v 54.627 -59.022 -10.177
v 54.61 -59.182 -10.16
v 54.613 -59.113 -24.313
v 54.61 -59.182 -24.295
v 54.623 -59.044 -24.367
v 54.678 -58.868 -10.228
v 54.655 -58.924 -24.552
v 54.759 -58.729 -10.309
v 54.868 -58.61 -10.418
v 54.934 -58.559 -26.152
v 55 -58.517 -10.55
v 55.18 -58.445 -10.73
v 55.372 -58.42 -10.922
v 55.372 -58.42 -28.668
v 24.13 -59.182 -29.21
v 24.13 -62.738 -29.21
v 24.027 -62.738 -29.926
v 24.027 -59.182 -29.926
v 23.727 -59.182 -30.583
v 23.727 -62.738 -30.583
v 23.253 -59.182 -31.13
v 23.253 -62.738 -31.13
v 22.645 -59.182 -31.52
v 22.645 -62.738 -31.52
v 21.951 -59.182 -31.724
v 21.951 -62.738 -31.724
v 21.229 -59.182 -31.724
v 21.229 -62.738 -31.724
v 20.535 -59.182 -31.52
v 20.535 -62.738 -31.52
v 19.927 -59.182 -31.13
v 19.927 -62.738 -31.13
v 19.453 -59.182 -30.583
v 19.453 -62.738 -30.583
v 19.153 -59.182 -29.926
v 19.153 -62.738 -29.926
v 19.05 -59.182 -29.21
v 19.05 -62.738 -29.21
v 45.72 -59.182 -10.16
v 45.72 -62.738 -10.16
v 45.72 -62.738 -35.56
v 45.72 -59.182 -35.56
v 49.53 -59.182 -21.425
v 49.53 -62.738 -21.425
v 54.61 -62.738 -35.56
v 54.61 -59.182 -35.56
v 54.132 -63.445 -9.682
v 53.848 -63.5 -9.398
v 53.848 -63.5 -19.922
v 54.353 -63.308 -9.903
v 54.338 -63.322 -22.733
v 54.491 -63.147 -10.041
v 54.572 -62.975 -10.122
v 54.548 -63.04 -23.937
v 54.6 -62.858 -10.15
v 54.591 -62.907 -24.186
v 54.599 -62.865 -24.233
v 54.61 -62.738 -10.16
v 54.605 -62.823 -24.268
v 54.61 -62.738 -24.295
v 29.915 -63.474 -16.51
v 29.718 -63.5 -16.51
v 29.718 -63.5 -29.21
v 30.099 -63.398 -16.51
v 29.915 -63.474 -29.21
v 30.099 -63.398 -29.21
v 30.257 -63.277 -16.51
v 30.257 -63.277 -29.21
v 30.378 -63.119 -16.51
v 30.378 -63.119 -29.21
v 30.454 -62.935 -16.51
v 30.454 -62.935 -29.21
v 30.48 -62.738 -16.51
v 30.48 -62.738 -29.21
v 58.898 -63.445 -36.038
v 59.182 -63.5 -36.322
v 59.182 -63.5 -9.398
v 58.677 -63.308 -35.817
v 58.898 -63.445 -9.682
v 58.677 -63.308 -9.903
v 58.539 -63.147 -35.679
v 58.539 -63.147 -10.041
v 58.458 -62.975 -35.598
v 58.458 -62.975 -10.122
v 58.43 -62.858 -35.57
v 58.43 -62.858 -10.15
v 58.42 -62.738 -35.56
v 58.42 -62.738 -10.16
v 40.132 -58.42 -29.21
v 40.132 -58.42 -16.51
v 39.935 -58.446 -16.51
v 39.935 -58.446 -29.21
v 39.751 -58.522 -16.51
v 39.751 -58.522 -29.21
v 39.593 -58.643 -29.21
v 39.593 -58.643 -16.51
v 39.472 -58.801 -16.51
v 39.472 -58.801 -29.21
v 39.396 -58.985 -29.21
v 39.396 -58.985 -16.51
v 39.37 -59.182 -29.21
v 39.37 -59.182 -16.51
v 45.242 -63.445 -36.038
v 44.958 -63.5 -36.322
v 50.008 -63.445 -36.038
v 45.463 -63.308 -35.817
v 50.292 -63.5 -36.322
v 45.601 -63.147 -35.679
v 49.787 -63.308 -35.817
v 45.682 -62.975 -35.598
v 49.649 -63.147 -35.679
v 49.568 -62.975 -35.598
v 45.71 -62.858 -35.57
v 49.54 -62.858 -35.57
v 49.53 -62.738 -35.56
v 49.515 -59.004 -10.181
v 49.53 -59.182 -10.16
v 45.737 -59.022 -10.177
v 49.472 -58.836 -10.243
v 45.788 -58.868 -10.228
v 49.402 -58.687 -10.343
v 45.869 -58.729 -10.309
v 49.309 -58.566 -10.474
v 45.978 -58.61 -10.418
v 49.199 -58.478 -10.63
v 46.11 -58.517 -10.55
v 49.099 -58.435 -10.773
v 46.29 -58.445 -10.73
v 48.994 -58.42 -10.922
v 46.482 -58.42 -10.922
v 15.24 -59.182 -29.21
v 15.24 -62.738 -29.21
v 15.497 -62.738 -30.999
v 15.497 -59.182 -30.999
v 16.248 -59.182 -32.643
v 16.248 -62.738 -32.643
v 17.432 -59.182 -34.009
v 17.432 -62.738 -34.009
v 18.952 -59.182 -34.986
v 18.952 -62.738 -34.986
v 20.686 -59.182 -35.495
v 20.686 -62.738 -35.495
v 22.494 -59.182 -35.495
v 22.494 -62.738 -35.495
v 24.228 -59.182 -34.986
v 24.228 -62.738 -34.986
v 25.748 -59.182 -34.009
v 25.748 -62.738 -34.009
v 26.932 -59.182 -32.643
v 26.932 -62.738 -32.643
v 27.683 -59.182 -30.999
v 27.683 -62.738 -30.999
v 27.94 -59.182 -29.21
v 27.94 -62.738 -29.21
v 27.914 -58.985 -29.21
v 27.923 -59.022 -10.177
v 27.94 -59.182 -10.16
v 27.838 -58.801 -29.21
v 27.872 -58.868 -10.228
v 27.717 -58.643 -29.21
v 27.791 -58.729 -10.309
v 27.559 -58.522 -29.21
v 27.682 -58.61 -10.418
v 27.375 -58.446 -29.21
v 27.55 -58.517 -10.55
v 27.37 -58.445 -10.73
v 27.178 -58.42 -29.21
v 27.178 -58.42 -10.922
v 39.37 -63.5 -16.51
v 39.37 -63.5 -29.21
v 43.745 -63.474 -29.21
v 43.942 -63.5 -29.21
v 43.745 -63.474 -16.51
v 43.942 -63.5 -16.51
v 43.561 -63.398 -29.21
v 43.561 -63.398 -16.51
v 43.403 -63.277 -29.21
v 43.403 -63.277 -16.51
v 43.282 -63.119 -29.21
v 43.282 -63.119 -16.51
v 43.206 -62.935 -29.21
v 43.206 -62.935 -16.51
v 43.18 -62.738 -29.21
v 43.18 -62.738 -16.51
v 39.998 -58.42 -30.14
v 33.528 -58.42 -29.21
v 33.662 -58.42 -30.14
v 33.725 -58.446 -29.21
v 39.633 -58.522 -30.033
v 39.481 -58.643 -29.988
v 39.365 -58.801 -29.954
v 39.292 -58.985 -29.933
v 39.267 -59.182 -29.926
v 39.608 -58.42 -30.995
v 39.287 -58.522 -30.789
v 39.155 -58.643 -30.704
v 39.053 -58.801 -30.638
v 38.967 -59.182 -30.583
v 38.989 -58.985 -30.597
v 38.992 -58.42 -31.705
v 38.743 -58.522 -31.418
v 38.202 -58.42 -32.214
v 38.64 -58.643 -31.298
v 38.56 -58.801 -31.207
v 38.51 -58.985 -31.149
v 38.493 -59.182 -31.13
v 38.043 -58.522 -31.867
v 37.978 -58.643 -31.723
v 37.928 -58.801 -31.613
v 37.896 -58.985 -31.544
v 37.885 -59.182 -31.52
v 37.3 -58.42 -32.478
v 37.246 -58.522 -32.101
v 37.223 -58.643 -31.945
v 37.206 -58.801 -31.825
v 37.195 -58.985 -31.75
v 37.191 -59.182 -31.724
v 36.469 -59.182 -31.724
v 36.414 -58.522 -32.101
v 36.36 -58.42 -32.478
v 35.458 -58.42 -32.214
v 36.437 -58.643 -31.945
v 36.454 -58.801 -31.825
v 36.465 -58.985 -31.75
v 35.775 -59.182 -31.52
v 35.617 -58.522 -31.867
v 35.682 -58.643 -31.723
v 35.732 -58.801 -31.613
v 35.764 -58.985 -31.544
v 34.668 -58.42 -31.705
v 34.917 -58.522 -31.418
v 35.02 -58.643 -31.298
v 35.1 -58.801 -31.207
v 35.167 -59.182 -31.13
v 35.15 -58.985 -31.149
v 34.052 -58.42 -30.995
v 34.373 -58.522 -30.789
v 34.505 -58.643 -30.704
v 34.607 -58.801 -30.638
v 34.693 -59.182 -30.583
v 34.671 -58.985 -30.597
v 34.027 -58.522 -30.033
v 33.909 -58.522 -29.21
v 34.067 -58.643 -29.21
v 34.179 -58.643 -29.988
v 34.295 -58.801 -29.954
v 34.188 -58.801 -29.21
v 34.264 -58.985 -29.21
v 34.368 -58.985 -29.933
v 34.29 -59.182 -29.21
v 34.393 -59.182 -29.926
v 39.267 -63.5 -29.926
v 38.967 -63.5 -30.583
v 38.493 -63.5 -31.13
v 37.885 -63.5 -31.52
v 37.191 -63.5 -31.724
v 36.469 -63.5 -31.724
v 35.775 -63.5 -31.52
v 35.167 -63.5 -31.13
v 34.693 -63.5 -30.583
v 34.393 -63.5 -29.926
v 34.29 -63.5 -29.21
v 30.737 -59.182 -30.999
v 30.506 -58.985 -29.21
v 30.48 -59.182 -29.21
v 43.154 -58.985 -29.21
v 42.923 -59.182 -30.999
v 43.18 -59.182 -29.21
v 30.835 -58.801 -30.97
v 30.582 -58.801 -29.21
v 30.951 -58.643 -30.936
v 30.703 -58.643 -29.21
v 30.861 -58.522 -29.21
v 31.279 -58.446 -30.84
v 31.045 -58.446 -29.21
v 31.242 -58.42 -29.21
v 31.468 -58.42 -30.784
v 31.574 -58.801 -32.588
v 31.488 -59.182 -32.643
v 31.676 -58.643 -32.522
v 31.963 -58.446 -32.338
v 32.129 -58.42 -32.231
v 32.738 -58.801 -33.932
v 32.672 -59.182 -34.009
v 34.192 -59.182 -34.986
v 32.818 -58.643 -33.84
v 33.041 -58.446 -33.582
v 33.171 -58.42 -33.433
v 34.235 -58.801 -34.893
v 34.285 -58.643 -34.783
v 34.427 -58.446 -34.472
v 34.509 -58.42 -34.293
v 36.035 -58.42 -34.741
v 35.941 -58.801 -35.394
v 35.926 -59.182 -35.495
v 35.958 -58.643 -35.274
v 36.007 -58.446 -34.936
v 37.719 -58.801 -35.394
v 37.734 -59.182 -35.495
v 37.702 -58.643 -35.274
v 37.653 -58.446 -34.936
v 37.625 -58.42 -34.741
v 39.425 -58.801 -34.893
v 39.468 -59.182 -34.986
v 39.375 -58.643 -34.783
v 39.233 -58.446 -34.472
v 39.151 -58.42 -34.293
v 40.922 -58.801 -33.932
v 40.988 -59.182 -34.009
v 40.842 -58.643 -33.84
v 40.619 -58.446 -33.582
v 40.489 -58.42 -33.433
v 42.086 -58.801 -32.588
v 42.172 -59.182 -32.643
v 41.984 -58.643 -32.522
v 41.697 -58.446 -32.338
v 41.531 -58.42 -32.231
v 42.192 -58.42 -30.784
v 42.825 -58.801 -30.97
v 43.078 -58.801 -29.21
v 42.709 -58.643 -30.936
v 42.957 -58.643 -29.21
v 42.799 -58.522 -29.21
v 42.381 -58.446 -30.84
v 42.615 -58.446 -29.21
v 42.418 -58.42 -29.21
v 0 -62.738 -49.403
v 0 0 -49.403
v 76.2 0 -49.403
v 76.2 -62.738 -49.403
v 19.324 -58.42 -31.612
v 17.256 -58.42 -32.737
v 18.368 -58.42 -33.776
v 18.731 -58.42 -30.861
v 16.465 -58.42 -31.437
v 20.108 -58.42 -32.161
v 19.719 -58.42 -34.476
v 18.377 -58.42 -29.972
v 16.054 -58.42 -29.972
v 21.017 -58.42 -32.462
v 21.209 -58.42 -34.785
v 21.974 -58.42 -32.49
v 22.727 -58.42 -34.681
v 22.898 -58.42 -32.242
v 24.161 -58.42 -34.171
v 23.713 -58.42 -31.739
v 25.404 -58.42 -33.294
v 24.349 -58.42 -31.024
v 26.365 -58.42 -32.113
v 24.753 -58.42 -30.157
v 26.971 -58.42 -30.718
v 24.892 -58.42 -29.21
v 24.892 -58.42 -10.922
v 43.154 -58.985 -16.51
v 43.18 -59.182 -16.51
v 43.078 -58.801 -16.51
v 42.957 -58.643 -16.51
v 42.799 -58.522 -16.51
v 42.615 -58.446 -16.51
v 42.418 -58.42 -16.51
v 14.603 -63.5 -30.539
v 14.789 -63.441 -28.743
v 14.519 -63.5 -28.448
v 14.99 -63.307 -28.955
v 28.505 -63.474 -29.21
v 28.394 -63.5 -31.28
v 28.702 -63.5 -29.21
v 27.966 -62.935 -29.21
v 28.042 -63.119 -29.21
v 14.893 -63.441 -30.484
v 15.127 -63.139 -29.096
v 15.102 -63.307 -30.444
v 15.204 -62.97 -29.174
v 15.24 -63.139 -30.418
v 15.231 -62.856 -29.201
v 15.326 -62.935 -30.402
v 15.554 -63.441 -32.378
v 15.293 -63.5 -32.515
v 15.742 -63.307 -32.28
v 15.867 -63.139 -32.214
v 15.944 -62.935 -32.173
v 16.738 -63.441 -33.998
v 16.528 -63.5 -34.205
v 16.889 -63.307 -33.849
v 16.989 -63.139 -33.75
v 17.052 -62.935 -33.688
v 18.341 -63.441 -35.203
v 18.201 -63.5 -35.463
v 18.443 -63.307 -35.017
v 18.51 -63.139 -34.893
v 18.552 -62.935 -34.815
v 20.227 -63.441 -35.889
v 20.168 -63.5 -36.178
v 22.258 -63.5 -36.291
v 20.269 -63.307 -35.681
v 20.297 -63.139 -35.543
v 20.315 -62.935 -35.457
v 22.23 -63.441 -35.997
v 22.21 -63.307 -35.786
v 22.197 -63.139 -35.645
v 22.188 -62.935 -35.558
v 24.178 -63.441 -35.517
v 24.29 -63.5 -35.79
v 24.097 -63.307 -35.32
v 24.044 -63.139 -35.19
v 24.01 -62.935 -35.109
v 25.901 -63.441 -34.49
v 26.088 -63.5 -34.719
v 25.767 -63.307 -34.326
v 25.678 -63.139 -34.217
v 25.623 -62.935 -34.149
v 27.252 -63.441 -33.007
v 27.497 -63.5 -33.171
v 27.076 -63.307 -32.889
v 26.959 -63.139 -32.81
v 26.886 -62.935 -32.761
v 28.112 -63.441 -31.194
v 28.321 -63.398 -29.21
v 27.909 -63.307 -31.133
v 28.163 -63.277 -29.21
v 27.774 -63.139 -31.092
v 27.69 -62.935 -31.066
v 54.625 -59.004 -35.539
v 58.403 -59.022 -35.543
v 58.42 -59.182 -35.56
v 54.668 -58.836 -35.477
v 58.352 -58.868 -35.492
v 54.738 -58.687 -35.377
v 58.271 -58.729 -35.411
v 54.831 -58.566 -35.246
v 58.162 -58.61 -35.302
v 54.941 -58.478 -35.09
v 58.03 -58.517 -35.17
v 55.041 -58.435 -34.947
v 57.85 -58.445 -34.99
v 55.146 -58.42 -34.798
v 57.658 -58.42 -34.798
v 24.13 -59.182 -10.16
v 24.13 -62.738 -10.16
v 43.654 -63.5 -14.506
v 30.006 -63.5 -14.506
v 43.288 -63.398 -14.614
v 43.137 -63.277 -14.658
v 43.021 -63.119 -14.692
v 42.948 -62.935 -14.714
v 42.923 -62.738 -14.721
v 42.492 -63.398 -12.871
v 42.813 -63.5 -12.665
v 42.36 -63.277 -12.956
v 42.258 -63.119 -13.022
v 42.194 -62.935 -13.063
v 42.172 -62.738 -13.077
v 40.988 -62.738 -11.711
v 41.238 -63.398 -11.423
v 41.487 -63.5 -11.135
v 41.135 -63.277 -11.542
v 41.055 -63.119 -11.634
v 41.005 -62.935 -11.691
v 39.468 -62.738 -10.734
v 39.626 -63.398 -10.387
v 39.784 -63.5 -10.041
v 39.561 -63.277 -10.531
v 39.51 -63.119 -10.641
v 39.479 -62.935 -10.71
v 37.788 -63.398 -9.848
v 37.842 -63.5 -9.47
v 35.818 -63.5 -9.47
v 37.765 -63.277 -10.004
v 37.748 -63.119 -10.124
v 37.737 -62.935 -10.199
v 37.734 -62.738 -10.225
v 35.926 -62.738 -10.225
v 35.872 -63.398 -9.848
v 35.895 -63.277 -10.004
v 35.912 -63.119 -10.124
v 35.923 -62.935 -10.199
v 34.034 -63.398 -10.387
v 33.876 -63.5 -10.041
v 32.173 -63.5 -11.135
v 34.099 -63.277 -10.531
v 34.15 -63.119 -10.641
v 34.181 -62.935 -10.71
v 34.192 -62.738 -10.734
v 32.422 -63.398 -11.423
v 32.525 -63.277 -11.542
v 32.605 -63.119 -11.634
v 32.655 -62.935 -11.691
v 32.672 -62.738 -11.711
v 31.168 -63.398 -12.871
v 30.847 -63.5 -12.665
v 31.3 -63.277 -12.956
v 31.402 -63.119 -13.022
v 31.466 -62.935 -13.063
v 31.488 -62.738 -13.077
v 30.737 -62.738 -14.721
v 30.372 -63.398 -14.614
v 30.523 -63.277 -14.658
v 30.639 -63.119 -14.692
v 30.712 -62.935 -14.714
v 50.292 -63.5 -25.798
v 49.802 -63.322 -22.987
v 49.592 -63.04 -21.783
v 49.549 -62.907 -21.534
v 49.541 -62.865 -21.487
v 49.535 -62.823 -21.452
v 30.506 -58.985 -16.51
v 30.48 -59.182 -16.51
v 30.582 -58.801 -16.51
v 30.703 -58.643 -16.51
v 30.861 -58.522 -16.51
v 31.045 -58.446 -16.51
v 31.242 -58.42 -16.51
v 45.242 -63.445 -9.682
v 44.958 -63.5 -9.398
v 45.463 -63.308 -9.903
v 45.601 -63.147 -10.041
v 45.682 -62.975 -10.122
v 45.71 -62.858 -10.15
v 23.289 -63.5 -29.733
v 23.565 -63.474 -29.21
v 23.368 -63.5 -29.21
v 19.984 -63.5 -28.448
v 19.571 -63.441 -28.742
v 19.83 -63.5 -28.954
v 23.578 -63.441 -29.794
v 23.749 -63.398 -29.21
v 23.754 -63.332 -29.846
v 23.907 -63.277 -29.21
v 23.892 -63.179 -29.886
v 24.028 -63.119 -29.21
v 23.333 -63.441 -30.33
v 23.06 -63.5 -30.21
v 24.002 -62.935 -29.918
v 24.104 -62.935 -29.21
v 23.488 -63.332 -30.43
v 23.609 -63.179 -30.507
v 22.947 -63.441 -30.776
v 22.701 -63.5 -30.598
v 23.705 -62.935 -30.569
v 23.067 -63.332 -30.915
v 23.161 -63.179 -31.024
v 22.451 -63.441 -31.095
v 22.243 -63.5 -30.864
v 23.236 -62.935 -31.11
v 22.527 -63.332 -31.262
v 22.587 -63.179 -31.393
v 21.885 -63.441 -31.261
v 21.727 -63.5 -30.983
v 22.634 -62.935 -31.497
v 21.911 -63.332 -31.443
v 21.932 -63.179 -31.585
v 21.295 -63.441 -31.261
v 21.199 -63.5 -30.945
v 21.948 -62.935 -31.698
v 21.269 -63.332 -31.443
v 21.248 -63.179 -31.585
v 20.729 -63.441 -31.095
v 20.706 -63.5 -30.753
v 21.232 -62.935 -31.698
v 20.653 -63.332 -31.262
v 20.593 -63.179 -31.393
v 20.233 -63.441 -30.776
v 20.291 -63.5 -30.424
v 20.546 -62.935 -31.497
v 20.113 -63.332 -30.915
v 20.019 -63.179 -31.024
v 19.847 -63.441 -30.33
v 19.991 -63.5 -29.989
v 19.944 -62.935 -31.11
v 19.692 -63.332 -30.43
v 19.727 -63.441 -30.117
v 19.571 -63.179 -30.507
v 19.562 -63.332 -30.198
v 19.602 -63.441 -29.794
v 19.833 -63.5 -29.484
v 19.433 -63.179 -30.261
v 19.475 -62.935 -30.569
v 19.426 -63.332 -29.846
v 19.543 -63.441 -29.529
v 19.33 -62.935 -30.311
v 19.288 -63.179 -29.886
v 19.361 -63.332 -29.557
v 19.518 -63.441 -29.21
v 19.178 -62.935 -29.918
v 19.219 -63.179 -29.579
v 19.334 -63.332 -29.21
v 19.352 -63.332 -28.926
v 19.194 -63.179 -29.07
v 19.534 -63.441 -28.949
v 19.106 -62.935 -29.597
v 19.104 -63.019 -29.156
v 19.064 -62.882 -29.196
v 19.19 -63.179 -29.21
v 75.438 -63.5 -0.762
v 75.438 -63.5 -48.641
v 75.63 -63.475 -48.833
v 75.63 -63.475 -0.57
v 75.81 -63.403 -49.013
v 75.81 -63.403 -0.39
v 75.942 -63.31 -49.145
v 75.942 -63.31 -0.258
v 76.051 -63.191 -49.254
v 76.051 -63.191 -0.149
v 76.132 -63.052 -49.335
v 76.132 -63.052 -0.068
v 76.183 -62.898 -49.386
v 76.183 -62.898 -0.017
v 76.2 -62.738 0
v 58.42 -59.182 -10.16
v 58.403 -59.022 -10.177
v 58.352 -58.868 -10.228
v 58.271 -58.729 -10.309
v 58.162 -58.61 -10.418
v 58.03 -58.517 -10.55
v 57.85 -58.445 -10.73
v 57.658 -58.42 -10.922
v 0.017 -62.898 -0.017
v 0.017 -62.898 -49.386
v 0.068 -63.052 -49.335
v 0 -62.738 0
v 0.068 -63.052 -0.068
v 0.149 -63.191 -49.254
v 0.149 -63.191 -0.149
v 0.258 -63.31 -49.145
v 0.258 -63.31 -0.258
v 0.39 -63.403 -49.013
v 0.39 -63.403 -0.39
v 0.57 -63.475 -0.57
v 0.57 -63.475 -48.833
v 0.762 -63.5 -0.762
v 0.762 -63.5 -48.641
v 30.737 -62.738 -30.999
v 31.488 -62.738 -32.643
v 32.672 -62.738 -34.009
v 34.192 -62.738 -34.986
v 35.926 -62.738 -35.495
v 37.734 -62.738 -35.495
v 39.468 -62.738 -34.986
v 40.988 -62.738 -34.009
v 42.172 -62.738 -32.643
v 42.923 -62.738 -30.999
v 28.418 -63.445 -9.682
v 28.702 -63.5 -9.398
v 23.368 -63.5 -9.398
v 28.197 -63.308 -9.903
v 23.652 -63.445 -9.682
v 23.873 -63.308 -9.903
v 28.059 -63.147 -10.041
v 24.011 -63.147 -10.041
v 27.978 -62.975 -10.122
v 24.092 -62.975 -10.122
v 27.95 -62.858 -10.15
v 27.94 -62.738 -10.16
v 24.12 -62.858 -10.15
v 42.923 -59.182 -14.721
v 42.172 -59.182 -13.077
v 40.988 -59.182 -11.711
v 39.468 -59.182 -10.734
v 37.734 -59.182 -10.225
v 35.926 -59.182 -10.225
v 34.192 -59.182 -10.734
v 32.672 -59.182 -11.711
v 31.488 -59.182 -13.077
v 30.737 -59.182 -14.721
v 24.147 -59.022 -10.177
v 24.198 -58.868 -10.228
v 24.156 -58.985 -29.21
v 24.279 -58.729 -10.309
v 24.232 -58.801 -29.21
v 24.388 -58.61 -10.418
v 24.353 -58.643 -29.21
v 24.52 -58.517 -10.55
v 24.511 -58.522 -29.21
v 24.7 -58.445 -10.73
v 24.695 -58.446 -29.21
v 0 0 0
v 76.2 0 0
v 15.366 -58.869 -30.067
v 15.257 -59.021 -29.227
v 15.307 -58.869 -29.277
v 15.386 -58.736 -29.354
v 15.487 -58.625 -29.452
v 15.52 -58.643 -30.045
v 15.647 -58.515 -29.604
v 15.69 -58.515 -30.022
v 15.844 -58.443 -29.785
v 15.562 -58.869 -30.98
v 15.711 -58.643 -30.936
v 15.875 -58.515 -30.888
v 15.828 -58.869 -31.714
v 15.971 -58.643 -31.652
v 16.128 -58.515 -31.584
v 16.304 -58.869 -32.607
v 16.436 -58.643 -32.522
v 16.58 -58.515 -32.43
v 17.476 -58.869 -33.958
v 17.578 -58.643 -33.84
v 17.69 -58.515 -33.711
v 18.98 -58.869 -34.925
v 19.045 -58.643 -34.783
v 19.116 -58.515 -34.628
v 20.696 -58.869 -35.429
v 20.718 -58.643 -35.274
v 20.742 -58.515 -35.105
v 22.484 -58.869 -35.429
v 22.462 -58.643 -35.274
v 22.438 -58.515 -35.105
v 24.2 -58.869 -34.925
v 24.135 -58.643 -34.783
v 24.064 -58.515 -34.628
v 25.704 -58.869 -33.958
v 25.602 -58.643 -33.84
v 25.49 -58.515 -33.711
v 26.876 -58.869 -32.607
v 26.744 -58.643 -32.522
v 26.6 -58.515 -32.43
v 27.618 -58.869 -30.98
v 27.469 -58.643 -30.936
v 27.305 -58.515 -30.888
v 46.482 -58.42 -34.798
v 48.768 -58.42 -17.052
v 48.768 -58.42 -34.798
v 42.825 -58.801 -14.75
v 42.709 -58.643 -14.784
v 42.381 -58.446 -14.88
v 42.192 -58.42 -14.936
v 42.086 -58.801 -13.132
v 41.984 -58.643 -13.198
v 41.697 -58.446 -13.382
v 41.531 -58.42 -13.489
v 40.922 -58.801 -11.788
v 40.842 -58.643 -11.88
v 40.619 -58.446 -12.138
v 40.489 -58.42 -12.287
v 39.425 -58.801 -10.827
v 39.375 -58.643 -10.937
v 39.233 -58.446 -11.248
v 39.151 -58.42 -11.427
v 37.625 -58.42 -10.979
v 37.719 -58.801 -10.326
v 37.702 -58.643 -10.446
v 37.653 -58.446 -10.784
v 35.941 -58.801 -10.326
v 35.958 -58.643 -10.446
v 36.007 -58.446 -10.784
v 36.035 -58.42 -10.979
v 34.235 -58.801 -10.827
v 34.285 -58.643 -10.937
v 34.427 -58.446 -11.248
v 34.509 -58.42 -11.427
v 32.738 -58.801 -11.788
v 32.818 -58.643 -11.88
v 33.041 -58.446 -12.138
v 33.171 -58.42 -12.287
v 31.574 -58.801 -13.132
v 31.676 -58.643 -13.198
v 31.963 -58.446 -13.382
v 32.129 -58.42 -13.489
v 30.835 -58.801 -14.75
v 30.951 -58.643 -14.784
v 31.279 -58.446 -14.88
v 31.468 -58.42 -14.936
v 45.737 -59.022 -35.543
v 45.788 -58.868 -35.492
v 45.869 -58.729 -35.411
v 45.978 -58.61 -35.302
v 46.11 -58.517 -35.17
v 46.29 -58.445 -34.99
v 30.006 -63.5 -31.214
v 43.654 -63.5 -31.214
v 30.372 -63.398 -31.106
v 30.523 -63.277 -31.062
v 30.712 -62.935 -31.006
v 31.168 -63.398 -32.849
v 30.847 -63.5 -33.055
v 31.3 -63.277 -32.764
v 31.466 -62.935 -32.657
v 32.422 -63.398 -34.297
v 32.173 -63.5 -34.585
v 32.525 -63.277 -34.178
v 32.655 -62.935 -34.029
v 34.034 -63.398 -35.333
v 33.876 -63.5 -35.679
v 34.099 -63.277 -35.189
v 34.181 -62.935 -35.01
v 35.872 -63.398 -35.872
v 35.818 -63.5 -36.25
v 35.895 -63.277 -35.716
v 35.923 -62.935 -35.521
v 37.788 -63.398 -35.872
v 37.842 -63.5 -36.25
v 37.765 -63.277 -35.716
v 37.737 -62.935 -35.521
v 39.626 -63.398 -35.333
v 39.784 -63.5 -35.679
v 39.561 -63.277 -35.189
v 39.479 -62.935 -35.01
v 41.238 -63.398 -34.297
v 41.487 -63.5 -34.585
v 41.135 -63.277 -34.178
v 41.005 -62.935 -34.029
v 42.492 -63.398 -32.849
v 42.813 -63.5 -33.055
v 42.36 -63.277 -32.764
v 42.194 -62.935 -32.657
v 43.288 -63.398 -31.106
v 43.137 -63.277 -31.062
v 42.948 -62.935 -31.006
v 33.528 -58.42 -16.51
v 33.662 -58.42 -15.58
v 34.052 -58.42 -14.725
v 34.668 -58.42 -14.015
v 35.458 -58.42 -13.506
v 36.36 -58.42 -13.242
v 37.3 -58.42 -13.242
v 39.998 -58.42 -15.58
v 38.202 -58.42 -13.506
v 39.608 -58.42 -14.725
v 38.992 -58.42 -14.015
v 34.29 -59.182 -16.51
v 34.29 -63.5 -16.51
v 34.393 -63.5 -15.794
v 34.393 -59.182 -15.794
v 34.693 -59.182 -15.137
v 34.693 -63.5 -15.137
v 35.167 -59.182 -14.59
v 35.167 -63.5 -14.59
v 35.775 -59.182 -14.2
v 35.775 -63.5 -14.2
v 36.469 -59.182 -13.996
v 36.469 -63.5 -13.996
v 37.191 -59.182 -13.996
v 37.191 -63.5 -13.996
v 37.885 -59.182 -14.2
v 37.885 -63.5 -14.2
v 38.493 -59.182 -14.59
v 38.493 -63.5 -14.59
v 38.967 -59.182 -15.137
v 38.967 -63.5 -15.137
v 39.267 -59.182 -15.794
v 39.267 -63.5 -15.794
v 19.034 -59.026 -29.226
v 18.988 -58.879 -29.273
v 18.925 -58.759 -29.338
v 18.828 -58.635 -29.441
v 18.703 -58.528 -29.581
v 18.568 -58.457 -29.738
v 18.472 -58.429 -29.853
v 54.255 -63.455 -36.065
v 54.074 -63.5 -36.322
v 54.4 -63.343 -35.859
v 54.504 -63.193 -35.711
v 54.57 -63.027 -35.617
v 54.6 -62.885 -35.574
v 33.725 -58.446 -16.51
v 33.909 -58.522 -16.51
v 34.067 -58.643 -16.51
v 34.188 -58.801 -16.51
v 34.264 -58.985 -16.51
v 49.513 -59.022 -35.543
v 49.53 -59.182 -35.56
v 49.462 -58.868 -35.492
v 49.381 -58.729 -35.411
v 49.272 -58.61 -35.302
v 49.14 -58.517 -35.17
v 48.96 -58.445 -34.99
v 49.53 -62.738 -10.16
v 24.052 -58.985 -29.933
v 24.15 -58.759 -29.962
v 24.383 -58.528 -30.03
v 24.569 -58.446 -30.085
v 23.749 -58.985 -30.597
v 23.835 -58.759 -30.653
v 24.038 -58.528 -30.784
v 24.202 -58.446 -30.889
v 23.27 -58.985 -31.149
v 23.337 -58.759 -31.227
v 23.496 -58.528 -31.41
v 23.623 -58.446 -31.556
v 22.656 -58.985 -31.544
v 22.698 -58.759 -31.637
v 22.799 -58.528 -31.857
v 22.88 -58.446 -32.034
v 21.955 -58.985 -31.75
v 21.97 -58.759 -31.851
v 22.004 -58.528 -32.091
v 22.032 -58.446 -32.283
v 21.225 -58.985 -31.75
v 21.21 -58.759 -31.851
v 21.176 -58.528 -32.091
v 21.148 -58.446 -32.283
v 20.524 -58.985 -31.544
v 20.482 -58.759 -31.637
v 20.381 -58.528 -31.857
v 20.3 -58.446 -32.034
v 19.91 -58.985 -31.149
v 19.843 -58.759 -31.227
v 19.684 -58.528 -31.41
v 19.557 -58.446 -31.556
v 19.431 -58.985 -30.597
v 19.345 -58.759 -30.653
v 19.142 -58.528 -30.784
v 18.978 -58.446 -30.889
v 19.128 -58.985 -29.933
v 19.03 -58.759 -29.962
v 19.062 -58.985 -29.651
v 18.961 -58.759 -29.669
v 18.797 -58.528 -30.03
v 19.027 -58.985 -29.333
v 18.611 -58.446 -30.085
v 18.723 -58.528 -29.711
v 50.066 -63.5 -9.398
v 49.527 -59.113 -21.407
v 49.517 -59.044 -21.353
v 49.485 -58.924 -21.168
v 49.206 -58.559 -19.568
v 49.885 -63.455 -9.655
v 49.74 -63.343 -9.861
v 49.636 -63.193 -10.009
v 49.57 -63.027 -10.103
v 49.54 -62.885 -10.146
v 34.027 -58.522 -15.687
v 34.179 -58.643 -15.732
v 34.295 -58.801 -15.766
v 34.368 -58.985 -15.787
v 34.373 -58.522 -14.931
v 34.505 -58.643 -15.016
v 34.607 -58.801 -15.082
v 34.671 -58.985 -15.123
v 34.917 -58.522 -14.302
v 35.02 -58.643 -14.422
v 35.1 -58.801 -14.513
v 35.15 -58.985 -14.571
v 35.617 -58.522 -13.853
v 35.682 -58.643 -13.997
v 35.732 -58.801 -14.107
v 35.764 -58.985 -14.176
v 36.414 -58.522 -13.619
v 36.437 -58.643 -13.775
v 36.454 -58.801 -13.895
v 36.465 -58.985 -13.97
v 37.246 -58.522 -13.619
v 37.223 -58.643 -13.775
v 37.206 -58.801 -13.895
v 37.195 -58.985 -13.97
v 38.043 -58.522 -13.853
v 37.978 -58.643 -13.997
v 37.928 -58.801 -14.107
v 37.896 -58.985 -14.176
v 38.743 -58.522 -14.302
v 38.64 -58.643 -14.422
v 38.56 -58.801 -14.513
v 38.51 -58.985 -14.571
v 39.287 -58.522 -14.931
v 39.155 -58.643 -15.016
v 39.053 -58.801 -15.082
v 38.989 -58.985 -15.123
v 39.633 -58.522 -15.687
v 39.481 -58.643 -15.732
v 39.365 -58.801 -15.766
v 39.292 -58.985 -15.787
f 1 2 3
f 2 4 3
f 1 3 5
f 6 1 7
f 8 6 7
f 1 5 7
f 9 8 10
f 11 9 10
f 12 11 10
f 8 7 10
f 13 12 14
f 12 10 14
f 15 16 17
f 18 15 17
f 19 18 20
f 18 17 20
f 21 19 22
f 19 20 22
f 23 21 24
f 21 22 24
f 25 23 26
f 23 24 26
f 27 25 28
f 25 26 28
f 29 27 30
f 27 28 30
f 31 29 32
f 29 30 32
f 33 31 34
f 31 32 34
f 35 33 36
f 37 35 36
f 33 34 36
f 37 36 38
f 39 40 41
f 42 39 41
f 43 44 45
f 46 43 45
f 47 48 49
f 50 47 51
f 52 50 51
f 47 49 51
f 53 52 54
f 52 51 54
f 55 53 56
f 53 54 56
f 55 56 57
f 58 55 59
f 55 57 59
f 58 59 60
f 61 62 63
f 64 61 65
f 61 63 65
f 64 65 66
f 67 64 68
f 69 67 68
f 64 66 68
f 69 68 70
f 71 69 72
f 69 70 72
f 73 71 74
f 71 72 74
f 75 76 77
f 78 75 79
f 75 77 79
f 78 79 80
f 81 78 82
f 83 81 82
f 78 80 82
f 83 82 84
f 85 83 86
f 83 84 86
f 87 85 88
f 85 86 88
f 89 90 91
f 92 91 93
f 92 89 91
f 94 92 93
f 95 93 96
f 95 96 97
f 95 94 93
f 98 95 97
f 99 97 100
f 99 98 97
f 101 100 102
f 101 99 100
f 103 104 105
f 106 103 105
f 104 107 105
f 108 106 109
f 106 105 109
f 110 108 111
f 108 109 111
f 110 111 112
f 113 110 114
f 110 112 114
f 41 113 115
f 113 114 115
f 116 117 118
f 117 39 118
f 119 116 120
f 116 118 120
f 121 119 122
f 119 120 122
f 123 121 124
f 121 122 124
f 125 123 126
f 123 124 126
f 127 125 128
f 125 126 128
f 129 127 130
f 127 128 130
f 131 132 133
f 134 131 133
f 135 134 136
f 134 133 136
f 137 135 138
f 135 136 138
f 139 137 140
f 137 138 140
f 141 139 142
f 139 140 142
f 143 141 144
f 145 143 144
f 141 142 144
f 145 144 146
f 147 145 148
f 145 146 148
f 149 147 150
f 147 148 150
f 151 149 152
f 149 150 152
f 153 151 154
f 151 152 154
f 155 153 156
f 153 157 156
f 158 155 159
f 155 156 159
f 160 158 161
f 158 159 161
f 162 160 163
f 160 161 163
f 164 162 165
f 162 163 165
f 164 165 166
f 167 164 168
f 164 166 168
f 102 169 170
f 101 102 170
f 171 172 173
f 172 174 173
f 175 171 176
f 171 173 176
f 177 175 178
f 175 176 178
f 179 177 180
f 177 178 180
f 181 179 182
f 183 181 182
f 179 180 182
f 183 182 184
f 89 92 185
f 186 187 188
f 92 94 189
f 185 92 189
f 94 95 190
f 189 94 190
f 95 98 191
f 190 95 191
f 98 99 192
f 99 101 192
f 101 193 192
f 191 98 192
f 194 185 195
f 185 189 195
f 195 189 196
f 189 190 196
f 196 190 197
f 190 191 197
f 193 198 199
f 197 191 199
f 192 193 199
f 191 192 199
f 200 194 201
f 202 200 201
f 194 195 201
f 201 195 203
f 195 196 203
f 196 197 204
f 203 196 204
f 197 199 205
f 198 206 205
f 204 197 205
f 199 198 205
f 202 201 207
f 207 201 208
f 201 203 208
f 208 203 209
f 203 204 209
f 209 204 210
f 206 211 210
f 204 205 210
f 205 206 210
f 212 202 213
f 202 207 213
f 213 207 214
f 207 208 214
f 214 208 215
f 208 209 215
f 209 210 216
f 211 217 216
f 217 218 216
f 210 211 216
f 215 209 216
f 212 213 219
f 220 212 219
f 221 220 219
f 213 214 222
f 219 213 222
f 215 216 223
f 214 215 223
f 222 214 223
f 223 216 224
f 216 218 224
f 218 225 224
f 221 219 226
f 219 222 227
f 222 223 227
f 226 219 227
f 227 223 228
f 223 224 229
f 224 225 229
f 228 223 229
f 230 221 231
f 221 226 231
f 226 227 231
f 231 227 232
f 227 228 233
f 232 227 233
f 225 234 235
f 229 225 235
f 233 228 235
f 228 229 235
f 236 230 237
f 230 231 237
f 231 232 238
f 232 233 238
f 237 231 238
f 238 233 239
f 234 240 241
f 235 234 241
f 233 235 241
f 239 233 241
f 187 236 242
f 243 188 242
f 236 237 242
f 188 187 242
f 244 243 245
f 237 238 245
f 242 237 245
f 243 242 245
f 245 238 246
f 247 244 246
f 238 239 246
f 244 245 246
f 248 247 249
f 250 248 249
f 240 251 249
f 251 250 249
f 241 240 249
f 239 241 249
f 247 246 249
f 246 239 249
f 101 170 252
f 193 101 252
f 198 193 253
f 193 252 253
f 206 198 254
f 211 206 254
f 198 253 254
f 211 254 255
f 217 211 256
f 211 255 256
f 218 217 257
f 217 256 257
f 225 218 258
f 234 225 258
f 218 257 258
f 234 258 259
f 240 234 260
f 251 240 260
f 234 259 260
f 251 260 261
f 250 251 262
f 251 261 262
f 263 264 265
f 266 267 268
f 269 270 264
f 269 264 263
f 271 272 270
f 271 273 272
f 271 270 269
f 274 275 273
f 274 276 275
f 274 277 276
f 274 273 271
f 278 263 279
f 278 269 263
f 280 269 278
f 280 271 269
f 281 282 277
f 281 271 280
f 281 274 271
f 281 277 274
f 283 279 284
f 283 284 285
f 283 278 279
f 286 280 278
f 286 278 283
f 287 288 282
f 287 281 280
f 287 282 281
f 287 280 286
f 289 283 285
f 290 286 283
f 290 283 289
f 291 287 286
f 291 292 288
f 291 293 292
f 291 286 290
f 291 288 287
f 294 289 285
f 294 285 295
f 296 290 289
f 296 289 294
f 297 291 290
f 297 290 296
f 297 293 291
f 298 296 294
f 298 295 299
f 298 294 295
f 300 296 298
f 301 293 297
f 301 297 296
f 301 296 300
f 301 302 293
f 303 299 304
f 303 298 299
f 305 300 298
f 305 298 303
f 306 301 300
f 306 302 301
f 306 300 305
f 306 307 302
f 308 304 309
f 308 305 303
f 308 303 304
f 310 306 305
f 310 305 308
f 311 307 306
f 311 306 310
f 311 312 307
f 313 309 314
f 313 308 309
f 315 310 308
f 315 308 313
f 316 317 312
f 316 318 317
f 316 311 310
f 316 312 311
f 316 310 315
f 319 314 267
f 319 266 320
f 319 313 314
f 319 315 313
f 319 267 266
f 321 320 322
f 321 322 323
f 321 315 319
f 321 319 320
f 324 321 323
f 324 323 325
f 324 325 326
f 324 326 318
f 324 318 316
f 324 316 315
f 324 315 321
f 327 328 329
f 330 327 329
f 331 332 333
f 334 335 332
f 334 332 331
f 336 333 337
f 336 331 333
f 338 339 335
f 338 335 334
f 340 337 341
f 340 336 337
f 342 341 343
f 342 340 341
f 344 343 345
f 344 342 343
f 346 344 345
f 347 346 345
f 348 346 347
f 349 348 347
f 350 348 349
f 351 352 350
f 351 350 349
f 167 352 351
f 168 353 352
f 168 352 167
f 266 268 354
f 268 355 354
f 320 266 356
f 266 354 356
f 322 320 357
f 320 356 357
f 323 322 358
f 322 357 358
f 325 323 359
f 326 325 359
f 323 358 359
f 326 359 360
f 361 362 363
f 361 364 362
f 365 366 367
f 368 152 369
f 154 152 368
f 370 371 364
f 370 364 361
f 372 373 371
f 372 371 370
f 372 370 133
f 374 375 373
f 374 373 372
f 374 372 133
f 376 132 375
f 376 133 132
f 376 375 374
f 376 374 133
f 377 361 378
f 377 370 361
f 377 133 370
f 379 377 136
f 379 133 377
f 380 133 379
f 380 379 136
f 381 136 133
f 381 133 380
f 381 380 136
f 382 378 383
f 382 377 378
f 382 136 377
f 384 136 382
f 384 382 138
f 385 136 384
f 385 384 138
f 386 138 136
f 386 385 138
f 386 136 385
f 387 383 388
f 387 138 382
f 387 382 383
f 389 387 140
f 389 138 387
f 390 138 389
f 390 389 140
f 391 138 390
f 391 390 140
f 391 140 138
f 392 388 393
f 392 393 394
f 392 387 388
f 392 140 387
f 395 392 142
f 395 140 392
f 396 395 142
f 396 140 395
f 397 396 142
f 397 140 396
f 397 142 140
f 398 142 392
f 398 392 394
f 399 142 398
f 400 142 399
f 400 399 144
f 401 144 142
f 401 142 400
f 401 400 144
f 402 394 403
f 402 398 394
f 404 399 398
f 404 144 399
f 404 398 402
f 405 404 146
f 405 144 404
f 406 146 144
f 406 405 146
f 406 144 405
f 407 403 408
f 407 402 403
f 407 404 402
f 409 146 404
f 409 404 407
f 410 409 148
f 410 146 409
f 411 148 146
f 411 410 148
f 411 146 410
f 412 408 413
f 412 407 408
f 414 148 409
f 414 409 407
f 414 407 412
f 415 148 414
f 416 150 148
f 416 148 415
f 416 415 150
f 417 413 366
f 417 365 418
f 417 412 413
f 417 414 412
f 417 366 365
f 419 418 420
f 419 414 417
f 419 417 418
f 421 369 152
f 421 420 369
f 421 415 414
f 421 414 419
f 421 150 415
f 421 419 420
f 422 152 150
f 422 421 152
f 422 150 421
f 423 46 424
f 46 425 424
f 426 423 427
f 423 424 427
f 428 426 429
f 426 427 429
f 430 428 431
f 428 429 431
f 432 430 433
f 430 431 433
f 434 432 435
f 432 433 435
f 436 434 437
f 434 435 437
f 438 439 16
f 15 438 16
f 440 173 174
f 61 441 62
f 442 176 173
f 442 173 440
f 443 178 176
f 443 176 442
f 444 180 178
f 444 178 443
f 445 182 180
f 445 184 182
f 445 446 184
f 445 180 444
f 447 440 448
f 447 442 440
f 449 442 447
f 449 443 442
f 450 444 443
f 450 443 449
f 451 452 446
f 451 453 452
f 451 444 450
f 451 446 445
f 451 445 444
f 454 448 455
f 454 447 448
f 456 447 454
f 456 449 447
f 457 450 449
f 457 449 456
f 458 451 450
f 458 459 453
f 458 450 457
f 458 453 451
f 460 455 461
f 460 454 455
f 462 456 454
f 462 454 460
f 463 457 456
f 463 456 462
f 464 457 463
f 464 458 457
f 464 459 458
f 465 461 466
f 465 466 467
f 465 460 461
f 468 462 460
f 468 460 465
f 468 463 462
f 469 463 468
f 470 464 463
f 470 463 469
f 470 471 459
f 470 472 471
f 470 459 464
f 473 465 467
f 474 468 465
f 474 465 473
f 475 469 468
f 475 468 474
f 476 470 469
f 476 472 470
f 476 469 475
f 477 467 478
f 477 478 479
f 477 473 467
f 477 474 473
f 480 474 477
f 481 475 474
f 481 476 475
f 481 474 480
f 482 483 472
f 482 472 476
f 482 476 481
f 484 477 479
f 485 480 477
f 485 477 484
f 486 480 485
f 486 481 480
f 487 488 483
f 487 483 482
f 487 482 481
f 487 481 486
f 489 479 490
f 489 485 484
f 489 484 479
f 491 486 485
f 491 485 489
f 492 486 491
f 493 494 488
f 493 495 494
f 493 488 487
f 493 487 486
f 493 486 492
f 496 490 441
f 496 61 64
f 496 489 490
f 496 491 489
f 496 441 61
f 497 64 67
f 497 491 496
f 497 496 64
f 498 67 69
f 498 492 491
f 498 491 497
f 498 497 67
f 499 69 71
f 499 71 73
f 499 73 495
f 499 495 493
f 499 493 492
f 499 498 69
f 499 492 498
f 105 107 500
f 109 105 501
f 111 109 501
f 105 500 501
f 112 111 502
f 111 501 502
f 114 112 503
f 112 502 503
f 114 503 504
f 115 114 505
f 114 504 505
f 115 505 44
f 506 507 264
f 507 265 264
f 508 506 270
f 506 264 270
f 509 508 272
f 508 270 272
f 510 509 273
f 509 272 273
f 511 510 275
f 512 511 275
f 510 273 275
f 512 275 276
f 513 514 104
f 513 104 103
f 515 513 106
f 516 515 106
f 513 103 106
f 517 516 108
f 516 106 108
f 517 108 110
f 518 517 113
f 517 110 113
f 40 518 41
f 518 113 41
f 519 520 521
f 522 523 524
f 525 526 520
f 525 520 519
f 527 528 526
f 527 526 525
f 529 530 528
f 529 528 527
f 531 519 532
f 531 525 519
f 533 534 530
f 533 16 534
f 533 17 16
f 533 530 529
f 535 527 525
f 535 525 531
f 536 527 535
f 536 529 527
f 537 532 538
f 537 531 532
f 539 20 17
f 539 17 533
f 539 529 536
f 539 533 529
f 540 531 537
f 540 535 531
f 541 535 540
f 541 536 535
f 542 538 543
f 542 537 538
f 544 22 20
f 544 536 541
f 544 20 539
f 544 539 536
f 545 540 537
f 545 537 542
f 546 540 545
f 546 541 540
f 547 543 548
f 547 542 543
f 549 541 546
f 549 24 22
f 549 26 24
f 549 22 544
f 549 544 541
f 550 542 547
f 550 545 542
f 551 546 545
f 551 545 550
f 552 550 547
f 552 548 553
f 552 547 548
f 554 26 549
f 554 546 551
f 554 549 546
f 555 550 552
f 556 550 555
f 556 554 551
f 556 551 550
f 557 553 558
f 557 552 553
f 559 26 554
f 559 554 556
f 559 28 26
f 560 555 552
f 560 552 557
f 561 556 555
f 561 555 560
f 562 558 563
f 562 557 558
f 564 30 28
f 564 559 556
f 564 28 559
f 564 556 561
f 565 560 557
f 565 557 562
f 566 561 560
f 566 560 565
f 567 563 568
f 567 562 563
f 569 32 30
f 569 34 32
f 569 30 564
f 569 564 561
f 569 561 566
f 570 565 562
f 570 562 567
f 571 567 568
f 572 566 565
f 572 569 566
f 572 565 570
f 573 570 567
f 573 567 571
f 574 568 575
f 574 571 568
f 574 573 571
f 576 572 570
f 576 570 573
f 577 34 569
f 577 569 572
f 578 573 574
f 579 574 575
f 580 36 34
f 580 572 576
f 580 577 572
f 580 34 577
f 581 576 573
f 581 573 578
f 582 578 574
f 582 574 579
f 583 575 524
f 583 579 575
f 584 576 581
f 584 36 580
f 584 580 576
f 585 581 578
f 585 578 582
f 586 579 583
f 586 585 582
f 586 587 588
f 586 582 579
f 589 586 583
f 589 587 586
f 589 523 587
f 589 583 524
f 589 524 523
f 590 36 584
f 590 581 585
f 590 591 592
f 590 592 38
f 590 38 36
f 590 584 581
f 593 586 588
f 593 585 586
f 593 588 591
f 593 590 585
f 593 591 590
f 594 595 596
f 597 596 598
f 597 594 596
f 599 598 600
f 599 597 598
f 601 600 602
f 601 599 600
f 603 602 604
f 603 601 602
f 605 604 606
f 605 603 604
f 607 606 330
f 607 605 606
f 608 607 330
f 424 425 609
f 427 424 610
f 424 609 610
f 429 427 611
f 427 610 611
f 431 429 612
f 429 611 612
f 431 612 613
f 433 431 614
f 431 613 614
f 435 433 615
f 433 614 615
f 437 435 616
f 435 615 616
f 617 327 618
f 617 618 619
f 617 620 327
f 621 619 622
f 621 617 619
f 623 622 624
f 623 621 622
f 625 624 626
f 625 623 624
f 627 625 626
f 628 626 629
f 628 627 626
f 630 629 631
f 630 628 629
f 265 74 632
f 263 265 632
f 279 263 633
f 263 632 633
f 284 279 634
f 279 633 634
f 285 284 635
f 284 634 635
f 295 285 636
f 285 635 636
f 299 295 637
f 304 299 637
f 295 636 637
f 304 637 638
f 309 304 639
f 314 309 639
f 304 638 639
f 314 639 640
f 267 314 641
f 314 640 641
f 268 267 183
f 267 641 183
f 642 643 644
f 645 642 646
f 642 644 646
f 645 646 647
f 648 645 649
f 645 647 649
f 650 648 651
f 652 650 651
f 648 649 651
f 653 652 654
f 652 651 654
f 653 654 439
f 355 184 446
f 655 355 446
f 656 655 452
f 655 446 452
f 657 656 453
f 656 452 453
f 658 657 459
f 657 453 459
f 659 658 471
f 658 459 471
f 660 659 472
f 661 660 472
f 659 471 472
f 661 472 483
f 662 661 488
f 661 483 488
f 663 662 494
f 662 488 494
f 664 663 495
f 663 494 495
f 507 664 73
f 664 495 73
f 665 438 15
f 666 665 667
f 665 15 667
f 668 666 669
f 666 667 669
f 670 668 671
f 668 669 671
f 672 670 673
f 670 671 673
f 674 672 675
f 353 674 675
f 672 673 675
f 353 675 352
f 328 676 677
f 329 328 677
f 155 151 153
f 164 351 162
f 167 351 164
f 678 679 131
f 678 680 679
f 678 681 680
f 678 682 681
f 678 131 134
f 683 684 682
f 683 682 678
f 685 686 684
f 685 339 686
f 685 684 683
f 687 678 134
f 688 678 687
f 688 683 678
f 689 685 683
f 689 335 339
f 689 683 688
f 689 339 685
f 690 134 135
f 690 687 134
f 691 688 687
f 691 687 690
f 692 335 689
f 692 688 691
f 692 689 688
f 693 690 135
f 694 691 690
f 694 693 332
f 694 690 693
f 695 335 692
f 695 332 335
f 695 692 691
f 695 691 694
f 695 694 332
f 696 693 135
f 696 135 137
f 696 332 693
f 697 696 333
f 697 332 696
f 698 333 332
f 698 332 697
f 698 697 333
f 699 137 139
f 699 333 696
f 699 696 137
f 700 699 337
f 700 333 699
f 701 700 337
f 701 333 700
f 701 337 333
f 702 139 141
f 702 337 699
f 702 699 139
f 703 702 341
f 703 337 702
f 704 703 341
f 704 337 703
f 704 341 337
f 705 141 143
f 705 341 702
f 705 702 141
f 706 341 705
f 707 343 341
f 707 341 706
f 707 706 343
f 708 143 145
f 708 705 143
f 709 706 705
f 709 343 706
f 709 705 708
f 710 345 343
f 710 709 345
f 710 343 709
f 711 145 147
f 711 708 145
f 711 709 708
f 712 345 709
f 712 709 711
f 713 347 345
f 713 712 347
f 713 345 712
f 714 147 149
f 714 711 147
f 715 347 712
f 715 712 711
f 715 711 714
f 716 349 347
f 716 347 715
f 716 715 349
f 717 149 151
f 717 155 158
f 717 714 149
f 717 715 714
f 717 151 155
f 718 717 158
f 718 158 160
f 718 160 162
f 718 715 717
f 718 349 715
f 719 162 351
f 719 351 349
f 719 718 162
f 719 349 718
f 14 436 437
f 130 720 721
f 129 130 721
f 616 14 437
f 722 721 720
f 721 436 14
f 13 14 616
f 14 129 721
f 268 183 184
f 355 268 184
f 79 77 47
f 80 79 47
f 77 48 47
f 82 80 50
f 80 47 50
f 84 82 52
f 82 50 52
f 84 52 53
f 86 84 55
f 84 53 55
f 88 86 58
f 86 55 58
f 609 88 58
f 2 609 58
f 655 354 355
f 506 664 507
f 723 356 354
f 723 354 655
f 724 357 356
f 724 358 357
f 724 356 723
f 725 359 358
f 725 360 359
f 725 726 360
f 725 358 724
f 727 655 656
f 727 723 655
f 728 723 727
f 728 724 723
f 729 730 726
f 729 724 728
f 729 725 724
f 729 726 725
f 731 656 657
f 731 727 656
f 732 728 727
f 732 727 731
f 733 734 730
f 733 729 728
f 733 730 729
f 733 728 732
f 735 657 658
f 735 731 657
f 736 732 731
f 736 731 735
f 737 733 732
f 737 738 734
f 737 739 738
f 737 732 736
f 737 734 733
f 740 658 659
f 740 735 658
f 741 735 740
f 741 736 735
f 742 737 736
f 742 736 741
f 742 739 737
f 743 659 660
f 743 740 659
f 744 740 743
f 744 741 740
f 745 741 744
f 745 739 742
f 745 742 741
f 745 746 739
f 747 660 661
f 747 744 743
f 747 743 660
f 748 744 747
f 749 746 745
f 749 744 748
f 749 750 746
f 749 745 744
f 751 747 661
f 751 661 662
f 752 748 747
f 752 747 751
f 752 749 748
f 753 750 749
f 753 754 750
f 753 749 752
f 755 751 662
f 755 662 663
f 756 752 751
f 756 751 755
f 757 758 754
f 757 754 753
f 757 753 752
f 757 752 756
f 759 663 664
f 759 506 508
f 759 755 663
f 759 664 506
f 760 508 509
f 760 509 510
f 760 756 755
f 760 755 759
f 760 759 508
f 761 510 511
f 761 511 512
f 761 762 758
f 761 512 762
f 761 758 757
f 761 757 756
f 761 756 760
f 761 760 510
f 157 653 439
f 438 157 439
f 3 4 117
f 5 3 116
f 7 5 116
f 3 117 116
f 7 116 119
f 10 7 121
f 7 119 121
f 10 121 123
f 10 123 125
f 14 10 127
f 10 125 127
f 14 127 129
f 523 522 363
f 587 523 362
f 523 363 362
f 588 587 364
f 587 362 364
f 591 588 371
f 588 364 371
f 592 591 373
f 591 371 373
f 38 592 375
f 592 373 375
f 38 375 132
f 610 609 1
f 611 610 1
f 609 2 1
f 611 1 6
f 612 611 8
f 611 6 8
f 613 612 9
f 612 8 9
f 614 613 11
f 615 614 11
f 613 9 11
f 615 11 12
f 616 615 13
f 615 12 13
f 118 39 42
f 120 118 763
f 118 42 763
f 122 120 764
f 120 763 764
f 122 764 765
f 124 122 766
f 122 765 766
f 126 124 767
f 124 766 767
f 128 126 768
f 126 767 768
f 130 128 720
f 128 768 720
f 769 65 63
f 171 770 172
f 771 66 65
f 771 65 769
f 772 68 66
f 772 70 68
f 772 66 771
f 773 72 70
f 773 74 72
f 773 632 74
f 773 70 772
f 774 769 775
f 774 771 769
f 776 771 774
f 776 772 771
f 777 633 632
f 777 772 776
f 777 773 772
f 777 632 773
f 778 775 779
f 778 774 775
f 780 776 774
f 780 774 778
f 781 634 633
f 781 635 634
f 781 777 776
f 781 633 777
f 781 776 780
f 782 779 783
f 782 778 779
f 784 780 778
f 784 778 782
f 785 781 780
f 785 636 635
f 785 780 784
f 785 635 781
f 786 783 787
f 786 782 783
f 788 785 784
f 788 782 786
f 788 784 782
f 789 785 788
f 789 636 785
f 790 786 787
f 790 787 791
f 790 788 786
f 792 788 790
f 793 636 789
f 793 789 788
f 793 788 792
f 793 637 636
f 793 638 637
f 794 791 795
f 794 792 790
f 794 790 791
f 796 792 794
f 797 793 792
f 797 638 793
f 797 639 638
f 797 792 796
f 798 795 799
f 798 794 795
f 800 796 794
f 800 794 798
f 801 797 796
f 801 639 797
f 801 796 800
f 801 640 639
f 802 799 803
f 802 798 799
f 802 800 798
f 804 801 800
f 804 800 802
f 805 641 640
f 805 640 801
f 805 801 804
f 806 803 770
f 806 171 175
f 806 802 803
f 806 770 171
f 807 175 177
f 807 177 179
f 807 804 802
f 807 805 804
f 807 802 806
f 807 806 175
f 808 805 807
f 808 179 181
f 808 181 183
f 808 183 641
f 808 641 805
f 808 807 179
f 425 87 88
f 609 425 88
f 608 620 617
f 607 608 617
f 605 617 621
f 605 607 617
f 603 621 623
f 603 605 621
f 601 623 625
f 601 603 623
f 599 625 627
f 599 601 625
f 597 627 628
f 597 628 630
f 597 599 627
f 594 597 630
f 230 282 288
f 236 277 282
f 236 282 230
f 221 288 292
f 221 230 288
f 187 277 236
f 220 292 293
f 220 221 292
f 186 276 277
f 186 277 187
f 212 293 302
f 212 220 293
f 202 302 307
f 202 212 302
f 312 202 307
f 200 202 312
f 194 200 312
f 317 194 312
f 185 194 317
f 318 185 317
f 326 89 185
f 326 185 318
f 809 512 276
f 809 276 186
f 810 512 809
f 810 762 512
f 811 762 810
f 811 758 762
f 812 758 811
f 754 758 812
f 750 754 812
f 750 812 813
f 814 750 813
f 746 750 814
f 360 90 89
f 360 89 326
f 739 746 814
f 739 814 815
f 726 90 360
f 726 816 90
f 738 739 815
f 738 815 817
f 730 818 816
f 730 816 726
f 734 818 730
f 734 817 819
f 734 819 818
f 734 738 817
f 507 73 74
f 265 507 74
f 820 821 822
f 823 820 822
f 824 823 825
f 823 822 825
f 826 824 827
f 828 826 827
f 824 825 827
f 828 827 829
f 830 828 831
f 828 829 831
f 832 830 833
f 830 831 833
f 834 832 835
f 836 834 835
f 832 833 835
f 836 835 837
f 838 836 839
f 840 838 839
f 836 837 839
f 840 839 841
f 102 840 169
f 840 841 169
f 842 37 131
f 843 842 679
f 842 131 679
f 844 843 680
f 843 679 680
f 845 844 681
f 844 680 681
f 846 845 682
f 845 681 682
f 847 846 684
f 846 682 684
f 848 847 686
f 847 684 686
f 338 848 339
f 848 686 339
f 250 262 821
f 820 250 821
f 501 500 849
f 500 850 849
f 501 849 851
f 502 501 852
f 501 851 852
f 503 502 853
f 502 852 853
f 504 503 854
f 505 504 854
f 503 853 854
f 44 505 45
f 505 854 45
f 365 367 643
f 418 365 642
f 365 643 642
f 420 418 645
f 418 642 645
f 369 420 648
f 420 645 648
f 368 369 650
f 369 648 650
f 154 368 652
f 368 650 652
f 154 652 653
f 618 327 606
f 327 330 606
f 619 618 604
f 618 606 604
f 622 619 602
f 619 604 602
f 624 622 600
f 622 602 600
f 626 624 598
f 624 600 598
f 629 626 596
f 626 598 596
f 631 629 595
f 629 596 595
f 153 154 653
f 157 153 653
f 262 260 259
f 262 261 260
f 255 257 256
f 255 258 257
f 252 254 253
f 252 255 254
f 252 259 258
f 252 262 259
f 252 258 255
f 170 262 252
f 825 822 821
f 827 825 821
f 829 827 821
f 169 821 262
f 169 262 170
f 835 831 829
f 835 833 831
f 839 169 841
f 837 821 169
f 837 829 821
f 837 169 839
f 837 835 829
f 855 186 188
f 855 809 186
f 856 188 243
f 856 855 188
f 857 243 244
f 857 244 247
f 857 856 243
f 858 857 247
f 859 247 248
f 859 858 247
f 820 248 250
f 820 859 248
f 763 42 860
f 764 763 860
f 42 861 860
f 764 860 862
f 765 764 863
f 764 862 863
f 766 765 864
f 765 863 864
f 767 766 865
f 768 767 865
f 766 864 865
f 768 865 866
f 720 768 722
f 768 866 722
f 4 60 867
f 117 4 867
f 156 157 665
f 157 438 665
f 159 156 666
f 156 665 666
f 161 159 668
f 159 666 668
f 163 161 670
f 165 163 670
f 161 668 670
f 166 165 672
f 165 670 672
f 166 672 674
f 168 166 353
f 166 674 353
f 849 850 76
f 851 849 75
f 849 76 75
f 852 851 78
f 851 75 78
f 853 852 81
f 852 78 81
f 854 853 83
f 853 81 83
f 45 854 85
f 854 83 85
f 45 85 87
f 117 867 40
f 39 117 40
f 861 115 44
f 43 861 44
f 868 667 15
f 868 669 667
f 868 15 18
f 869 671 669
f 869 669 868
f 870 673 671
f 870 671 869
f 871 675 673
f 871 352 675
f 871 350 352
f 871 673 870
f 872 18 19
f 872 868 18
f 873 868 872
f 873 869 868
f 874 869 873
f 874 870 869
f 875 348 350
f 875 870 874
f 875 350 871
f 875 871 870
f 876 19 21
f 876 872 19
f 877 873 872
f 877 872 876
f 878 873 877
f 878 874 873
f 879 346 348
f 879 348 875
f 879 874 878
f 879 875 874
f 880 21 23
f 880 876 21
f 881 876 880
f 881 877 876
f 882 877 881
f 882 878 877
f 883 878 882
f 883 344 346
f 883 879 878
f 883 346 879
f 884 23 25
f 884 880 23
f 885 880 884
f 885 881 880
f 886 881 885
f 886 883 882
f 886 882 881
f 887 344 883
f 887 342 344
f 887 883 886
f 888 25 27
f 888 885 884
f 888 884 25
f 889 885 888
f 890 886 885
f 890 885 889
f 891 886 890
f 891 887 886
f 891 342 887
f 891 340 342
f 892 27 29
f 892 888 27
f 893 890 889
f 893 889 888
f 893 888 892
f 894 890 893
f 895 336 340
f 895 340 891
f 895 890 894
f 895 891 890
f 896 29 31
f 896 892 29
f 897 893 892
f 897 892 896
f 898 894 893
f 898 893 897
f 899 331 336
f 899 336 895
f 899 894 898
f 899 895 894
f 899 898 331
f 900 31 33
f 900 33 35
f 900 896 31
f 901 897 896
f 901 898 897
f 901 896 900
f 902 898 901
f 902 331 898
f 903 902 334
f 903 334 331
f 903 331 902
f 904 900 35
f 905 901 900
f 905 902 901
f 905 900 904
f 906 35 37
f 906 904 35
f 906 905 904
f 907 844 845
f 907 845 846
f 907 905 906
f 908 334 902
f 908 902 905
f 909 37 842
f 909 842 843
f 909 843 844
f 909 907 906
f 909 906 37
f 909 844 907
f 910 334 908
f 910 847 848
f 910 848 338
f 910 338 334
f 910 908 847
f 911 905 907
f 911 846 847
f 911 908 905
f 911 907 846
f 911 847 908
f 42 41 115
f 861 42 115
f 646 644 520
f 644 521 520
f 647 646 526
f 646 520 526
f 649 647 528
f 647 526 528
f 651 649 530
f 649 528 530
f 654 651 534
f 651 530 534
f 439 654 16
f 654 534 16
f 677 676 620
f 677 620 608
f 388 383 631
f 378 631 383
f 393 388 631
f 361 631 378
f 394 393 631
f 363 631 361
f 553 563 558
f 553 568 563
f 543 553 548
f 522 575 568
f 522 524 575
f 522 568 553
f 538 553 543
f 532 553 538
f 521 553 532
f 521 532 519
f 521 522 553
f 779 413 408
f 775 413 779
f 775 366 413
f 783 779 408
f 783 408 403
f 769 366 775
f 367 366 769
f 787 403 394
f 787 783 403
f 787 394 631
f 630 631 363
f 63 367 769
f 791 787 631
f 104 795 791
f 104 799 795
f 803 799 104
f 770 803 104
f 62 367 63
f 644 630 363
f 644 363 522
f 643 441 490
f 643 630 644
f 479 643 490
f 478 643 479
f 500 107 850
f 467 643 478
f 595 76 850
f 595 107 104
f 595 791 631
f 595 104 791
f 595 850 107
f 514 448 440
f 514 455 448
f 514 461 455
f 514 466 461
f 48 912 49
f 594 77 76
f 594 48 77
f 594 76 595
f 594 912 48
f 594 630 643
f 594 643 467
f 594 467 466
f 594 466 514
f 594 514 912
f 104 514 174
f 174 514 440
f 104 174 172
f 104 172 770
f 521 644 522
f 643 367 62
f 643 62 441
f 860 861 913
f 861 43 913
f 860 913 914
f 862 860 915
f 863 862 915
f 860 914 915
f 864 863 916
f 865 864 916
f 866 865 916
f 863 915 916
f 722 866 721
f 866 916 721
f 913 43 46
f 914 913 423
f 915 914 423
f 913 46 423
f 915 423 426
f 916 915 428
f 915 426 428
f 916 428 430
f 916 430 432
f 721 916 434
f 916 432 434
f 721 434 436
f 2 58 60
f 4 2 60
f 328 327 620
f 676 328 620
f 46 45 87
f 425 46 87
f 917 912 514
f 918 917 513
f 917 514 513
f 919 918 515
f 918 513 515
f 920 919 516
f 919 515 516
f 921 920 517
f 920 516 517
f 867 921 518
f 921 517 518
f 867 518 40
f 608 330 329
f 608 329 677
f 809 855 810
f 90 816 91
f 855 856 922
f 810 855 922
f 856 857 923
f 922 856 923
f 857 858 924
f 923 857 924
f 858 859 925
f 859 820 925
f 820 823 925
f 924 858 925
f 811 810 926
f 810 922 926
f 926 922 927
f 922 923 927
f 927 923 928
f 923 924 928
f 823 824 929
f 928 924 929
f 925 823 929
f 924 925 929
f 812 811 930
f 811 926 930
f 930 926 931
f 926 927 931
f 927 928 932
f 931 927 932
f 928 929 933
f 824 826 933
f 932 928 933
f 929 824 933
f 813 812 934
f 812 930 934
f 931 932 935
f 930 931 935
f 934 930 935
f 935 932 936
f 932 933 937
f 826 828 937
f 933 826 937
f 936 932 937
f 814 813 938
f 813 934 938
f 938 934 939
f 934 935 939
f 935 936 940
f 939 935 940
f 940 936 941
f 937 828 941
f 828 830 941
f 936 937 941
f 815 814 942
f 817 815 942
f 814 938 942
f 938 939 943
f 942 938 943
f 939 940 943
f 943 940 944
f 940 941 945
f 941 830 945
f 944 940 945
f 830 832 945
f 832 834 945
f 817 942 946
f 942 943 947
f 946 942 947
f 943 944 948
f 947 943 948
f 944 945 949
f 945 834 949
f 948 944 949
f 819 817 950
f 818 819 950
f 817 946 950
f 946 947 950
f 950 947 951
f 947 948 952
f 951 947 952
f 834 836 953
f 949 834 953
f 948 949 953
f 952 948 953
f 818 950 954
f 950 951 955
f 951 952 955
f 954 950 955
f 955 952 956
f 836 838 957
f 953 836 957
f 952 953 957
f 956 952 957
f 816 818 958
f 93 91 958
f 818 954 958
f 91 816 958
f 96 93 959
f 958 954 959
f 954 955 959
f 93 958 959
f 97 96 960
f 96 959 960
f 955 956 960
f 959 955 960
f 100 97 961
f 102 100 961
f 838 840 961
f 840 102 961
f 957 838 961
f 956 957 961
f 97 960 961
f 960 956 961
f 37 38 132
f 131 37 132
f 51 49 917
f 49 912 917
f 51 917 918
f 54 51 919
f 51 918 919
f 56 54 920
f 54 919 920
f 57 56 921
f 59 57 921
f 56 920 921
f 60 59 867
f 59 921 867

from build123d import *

# Parameters (mm, degrees)
F0_W     = 76.2
F0_H     = 49.403003
F1_DEPTH = 63.5
F3_DEPTH = 5.08
F4_R     = 0.762


with BuildPart() as f1:
    # F0 (on Front) → F1 (new body)
    with BuildSketch(Plane.XZ):
        with Locations((38.1, -24.701501)):
            Rectangle(F0_W, F0_H)
    extrude(amount=F1_DEPTH)

    # F2 (on face) → F3 (cut)
    with BuildSketch(Plane.XZ.offset(63.5)):
        with BuildLine():
            Line((27.94, -10.16), (24.13, -10.16))
            Line((24.13, -10.16), (24.13, -29.21))
            ThreePointArc((24.13, -29.21), (21.59, -31.75), (19.05, -29.21))
            Line((19.05, -29.21), (15.24, -29.21))
            ThreePointArc((15.24, -29.21), (21.59, -35.56), (27.94, -29.21))
            Line((27.94, -29.21), (27.94, -10.16))
        make_face()
        with BuildLine():
            Line((43.18, -29.21), (43.18, -16.51))
            ThreePointArc((43.18, -16.51), (36.83, -10.16), (30.48, -16.51))
            Line((30.48, -16.51), (30.48, -29.21))
            ThreePointArc((30.48, -29.21), (36.83, -35.56), (43.18, -29.21))
        make_face()
        with BuildLine():
            ThreePointArc((34.29, -16.51), (36.83, -13.97), (39.37, -16.51))
            Line((39.37, -16.51), (39.37, -29.21))
            ThreePointArc((39.37, -29.21), (36.83, -31.75), (34.29, -29.21))
            Line((34.29, -29.21), (34.29, -16.51))
        make_face(mode=Mode.SUBTRACT)
        Polygon((45.72, -10.16), (45.72, -35.56), (49.53, -35.56), (49.53, -21.425062), (54.61, -35.56), (58.42, -35.56), (58.42, -10.16), (54.61, -10.16), (54.61, -24.294938), (49.53, -10.16), align=None)
    extrude(amount=-F3_DEPTH, mode=Mode.SUBTRACT)

    # F4
    f4_edges = [f1.edges().sort_by_distance(p)[0] for p in [
        (38.1, -63.5, 0),
        (0, -63.5, -24.701501),
        (38.1, -63.5, -49.403003),
        (76.2, -63.5, -24.701501),
        (58.42, -63.5, -22.86),
        (56.515, -63.5, -10.16),
        (54.61, -63.5, -17.227469),
        (52.07, -63.5, -17.227469),
        (47.625, -63.5, -10.16),
        (45.72, -63.5, -22.86),
        (47.625, -63.5, -35.56),
        (49.53, -63.5, -28.492531),
        (52.07, -63.5, -28.492531),
        (56.515, -63.5, -35.56),
        (43.18, -63.5, -22.86),
        (36.83, -63.5, -10.16),
        (30.48, -63.5, -22.86),
        (36.83, -63.5, -35.56),
        (27.94, -63.5, -19.685),
        (26.035, -63.5, -10.16),
        (24.13, -63.5, -19.685),
        (21.59, -63.5, -31.75),
        (17.145, -63.5, -29.21),
        (21.59, -63.5, -35.56),
        (43.18, -58.42, -22.86),
        (36.83, -58.42, -10.16),
        (30.48, -58.42, -22.86),
        (36.83, -58.42, -35.56),
        (36.83, -58.42, -13.97),
        (39.37, -58.42, -22.86),
        (36.83, -58.42, -31.75),
        (34.29, -58.42, -22.86),
        (45.72, -58.42, -22.86),
        (47.625, -58.42, -35.56),
        (49.53, -58.42, -28.492531),
        (52.07, -58.42, -28.492531),
        (56.515, -58.42, -35.56),
        (58.42, -58.42, -22.86),
        (56.515, -58.42, -10.16),
        (54.61, -58.42, -17.227469),
        (52.07, -58.42, -17.227469),
        (47.625, -58.42, -10.16),
        (27.94, -58.42, -19.685),
        (26.035, -58.42, -10.16),
        (24.13, -58.42, -19.685),
        (21.59, -58.42, -31.75),
        (17.145, -58.42, -29.21),
        (21.59, -58.42, -35.56),
    ]]
    fillet(f4_edges, radius=F4_R)


solid = f1.part
